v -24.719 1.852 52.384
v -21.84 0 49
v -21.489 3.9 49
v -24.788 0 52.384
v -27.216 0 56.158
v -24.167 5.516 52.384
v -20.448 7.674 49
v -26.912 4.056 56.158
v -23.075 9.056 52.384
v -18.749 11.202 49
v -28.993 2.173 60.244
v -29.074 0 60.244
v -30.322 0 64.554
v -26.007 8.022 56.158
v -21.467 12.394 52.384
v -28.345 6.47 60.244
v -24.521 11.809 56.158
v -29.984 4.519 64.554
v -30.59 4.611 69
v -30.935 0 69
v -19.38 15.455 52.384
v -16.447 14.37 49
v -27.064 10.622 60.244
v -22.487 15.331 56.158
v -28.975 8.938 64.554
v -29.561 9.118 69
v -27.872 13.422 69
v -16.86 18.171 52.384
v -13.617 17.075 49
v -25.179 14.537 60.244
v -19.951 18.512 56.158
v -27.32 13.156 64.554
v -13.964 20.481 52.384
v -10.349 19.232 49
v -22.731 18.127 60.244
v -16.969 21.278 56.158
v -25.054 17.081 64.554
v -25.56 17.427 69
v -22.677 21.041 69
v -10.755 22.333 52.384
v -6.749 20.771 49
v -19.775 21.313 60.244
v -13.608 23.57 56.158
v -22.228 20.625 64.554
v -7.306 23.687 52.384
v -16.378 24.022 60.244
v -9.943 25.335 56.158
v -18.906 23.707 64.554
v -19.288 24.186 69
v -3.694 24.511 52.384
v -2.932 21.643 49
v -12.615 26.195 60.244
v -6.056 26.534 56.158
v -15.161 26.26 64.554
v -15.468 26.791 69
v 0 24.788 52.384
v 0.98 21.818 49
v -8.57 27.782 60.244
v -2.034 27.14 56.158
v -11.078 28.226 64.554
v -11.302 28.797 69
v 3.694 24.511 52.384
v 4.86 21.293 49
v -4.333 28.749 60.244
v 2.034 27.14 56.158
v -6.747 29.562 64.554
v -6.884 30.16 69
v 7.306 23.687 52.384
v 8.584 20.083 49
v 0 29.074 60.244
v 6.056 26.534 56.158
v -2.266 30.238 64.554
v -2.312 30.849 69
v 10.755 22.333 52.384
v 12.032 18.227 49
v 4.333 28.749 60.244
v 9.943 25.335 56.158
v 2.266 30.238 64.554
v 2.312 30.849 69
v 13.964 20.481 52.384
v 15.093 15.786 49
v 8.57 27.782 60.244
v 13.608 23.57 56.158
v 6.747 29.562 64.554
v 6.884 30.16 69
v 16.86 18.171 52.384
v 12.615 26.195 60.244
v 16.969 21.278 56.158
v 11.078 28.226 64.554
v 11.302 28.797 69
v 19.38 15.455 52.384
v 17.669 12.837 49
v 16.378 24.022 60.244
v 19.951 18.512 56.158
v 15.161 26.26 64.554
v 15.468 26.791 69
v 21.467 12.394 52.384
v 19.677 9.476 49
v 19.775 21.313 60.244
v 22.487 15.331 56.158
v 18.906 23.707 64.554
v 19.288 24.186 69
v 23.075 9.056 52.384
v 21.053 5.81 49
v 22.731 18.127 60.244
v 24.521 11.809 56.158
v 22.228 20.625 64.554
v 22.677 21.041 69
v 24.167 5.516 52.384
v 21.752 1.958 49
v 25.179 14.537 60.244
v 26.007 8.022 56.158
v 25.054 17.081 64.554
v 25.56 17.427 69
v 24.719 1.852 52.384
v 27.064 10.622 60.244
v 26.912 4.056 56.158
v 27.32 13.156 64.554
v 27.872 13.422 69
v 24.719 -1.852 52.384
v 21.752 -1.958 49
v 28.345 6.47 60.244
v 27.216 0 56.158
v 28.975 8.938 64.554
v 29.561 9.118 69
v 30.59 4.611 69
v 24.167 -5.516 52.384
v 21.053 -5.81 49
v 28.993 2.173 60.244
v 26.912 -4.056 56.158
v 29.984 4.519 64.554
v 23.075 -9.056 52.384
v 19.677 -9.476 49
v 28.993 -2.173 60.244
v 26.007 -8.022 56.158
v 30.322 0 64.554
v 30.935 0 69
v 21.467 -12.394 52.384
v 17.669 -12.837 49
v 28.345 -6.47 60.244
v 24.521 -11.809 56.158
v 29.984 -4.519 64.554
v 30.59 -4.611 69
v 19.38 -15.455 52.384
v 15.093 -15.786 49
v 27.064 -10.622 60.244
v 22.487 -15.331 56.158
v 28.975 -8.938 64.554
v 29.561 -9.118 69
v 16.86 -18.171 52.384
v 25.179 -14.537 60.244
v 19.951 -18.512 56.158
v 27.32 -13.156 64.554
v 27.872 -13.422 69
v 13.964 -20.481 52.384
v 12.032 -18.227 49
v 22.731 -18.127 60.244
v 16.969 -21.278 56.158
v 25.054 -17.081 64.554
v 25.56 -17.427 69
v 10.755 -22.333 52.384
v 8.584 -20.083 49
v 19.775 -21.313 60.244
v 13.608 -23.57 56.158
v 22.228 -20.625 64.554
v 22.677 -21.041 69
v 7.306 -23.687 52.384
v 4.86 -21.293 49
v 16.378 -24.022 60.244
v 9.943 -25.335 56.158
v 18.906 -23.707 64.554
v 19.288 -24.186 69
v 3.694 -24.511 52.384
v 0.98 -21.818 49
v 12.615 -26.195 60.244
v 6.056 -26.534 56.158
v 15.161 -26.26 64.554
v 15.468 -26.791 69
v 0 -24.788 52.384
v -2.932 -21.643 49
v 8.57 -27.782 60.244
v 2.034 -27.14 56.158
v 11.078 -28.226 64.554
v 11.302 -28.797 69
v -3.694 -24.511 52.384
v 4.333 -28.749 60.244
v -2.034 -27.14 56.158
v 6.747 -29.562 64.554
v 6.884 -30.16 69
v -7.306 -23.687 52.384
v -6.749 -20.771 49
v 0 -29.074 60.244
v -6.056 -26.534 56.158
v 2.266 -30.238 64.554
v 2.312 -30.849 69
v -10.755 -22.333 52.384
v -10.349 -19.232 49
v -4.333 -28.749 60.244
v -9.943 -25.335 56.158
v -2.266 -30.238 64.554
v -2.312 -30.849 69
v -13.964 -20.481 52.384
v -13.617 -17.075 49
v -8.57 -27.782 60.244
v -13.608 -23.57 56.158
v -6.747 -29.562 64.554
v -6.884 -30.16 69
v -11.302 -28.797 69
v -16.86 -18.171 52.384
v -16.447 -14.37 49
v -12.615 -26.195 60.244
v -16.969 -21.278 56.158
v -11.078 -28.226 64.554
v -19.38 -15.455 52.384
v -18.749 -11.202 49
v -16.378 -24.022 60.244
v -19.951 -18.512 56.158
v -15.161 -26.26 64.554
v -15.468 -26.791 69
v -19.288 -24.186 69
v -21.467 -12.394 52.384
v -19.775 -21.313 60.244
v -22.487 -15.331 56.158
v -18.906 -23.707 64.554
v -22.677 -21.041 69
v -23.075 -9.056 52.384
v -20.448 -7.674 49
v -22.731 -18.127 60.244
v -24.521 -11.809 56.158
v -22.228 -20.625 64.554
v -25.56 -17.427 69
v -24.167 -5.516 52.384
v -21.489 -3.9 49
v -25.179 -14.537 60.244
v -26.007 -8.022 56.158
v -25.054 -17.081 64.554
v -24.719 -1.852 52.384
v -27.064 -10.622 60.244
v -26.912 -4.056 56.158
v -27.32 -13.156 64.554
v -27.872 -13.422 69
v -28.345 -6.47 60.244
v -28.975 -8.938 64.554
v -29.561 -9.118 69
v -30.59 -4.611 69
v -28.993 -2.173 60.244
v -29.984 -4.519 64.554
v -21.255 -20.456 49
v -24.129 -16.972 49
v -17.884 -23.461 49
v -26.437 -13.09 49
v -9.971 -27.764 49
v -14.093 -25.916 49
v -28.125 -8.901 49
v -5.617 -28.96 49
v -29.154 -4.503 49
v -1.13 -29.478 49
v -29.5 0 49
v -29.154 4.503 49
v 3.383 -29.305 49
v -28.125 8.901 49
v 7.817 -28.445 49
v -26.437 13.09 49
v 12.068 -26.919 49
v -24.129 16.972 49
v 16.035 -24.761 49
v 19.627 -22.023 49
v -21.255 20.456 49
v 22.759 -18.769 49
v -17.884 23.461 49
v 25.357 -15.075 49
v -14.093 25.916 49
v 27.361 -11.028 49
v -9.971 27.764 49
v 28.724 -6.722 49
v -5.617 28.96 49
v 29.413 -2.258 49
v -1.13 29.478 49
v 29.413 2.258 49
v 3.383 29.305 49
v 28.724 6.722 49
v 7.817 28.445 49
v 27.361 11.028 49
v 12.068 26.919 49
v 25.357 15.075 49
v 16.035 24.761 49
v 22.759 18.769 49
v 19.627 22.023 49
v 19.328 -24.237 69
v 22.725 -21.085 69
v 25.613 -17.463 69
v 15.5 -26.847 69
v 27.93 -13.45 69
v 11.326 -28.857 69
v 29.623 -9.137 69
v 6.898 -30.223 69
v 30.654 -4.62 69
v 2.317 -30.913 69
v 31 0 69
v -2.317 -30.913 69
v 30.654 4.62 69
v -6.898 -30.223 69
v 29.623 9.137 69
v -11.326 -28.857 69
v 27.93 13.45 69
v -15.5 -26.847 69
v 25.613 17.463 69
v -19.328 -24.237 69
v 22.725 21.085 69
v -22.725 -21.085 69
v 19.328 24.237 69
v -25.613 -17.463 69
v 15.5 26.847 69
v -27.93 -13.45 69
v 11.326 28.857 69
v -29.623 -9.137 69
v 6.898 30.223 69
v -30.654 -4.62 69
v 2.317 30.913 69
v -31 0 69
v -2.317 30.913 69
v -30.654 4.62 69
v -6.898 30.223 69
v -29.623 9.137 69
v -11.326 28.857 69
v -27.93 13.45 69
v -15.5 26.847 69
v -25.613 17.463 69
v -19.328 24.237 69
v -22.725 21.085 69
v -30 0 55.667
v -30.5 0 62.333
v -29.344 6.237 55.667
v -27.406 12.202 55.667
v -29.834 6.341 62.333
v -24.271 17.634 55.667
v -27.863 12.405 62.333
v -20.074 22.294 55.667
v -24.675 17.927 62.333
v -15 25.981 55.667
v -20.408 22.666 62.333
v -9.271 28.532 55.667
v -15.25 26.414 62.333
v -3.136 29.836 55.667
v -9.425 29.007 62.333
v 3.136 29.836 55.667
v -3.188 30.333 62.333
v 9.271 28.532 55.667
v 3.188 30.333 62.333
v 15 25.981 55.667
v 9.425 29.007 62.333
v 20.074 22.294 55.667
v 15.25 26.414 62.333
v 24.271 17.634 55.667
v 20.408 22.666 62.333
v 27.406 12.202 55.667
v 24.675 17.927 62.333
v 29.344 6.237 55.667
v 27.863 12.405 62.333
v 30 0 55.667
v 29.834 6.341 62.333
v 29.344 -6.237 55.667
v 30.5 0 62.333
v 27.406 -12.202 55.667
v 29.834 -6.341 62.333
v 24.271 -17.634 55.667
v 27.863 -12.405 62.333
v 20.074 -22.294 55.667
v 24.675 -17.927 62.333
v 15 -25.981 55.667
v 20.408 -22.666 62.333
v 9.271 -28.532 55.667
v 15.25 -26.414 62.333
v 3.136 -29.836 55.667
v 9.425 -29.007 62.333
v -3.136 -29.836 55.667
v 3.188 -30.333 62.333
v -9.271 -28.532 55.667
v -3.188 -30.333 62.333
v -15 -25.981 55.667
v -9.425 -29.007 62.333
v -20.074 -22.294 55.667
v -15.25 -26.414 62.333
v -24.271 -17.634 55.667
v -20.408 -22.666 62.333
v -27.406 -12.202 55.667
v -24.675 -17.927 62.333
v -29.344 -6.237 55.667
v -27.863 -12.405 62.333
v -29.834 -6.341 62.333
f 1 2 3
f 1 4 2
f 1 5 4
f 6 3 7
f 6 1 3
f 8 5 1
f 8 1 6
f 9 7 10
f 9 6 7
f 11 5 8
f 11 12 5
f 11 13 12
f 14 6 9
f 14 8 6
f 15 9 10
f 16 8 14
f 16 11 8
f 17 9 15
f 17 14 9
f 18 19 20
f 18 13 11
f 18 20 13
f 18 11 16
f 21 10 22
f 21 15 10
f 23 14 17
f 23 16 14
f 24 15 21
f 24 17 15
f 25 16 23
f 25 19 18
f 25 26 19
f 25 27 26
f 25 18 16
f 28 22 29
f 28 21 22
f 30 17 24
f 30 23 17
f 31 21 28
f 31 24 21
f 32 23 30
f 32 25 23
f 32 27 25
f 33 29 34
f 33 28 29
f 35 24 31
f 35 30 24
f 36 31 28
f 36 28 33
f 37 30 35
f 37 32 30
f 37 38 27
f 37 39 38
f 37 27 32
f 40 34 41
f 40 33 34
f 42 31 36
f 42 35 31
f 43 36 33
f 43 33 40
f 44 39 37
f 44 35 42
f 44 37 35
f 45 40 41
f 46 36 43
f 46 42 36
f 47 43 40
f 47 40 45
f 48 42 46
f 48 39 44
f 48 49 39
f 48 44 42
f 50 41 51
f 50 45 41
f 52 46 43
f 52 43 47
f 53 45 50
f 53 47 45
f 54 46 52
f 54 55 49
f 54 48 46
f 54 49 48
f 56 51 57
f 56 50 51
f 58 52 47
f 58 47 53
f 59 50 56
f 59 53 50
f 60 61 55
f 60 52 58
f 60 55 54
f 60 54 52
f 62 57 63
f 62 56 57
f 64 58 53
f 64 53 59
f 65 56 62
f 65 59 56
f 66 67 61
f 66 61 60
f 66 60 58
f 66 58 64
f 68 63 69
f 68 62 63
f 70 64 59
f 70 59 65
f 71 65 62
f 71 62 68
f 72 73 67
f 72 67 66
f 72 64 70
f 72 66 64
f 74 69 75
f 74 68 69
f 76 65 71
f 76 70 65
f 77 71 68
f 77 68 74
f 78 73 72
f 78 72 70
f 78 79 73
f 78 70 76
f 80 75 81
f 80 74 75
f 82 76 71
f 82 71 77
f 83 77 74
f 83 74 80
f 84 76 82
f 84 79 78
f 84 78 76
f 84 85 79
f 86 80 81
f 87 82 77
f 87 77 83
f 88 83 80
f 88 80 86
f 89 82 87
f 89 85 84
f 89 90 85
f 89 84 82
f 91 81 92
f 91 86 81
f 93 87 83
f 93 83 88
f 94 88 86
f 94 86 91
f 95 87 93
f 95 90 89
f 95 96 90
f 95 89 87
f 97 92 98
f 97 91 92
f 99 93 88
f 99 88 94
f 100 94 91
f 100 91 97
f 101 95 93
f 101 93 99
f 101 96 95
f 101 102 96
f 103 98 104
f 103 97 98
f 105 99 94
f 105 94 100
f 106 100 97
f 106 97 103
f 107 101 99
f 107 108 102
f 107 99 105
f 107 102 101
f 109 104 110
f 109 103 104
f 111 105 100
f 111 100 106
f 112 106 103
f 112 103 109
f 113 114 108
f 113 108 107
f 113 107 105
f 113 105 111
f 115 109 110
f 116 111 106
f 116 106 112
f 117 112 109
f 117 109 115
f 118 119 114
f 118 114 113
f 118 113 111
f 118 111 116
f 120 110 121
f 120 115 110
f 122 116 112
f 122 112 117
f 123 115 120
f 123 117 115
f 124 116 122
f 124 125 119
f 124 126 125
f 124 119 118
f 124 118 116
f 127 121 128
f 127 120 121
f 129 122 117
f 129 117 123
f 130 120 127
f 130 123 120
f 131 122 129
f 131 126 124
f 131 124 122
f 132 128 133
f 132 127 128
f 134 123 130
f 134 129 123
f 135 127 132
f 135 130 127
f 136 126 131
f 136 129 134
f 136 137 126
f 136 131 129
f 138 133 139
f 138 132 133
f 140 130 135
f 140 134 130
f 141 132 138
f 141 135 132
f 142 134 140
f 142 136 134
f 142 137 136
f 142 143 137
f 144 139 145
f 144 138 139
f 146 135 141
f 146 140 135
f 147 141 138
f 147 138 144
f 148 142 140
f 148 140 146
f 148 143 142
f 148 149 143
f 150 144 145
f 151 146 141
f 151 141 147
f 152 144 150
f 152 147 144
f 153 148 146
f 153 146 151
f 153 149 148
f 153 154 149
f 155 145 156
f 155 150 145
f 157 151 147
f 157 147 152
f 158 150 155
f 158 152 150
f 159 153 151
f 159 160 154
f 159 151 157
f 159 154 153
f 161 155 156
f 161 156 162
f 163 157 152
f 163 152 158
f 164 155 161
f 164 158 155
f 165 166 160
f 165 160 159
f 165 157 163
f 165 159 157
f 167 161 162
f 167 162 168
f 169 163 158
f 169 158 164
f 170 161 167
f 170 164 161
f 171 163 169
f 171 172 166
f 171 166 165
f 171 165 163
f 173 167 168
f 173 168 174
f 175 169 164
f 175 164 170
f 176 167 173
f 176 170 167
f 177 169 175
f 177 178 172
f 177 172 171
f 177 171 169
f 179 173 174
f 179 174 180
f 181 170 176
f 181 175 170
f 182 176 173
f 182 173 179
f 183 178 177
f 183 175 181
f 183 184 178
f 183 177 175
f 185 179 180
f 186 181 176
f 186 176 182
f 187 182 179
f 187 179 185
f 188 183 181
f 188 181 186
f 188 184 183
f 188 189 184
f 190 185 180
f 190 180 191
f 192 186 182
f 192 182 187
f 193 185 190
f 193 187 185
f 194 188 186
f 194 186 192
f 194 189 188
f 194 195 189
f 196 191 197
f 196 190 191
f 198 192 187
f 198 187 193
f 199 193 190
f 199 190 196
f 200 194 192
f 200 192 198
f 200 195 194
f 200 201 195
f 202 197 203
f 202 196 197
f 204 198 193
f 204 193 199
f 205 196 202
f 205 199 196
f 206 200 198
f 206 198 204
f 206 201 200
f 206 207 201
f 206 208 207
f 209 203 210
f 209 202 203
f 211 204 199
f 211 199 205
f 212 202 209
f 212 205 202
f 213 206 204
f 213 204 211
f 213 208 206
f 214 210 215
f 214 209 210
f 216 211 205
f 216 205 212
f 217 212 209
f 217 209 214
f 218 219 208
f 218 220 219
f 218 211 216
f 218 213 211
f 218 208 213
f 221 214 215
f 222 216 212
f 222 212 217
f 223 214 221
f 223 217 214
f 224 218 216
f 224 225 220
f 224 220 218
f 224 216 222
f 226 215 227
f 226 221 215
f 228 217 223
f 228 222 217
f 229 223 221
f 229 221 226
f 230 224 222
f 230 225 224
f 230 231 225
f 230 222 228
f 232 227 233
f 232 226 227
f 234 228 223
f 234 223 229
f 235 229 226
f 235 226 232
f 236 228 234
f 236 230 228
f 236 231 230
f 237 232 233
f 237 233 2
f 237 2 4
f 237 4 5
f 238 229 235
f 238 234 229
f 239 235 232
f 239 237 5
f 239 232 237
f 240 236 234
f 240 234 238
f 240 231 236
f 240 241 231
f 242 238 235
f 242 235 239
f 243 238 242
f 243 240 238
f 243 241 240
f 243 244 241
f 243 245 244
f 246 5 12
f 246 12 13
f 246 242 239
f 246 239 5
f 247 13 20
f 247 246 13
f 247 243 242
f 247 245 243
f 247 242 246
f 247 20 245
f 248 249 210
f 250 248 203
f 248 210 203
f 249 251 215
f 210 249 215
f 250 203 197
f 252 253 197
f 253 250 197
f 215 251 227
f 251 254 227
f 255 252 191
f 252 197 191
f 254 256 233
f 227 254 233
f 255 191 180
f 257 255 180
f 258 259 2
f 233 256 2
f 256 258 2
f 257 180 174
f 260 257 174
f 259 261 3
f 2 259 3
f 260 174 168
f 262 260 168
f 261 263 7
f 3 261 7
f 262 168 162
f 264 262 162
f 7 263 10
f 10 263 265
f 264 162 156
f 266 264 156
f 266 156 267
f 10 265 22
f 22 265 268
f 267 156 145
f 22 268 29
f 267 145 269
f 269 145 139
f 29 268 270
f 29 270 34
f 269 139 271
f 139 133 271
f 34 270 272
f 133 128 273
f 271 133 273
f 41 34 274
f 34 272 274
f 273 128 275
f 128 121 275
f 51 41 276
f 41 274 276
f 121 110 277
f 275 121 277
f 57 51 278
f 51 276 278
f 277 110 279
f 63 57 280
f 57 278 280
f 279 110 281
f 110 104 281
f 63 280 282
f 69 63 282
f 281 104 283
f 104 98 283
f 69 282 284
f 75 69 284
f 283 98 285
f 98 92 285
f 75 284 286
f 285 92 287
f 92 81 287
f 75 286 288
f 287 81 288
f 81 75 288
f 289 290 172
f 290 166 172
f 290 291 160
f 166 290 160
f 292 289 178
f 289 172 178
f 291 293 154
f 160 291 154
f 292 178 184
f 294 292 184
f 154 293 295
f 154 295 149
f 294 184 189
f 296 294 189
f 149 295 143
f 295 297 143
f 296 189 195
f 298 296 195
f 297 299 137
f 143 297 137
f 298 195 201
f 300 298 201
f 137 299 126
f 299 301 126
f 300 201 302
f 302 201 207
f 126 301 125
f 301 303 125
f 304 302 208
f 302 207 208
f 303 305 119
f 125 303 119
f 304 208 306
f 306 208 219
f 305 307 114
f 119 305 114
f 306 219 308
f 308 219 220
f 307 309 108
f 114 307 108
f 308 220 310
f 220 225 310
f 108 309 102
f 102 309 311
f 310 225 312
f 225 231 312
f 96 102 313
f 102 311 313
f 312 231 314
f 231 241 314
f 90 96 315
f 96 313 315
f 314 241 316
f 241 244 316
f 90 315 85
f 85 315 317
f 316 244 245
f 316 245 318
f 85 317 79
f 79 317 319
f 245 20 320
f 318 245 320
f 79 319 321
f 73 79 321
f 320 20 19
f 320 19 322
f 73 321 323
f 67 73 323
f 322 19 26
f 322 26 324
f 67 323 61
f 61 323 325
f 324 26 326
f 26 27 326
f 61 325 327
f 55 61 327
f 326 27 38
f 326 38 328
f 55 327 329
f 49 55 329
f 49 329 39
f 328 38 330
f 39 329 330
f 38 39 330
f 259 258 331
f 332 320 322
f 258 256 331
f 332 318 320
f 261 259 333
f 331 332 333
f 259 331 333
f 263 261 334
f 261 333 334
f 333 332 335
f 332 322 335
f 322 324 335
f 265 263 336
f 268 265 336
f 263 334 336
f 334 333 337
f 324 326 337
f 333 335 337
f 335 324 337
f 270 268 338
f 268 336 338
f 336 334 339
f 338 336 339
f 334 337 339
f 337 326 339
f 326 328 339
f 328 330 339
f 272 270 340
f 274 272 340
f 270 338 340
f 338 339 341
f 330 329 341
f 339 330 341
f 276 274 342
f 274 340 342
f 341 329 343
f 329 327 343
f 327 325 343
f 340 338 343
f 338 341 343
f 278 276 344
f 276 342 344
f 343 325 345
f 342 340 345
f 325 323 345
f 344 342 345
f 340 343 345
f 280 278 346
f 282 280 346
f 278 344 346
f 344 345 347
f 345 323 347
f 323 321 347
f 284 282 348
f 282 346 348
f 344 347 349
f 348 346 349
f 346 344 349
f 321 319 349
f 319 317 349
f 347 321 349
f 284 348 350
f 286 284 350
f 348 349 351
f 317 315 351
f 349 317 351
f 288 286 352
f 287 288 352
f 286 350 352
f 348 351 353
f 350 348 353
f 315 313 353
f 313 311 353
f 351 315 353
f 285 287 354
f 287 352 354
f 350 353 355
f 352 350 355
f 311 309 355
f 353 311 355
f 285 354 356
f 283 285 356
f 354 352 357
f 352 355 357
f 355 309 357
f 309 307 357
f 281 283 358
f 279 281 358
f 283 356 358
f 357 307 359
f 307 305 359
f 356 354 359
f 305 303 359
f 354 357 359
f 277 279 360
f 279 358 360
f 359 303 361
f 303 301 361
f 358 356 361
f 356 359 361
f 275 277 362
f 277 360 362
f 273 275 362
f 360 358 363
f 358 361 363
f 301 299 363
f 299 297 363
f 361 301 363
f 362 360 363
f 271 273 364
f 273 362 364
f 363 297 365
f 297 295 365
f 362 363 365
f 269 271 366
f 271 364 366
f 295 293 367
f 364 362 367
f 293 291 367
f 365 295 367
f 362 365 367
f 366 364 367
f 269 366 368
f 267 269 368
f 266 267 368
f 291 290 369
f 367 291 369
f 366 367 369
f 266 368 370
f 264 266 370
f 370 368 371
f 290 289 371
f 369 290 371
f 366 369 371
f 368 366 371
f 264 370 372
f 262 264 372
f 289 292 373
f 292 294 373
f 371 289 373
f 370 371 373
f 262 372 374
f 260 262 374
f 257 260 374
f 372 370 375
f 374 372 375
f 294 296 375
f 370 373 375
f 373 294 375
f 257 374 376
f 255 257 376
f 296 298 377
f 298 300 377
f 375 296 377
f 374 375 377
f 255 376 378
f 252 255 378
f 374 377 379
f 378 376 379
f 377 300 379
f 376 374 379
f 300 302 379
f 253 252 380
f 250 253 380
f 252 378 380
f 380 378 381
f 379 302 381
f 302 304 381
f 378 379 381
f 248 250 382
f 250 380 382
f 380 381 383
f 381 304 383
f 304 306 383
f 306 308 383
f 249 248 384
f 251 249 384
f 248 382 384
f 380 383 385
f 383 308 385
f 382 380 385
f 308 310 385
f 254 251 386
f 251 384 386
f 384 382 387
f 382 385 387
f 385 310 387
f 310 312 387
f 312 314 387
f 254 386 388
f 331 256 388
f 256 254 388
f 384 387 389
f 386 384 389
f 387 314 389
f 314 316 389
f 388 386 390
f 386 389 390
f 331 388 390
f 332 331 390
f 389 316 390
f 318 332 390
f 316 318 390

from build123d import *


with BuildPart() as sphere:
    # Sphere → Sphere (revolve)
    with BuildSketch(Plane(origin=(0, 0, 71), x_dir=(1, 0, 0), z_dir=(0, -1, 0))):
        with BuildLine():
            ThreePointArc((0, -31), (31, 0), (0, 31))
            Line((0, 31), (0, -31))
        make_face()
    revolve(axis=Axis((0, 0, 71), (0, 0, 1)))


with BuildPart() as cut002:
    # Cone002 → Cone002 (revolve)
    with BuildSketch(Plane(origin=(0, 0, 49), x_dir=(1, 0, 0), z_dir=(0, -1, 0))):
        Polygon((0, 0), (29.5, 0), (31, 20), (0, 20), align=None)
    revolve(axis=Axis((0, 0, 49), (0, 0, 1)))

    # Cut002: cut Sphere
    add(sphere.part, mode=Mode.SUBTRACT)


with BuildPart() as part_mirroring002:
    # Part__Mirroring002: instance of Cut002
    add(cut002.part.mirror(Plane(origin=(0, 0, 0), x_dir=(0, -1, 0), z_dir=(1, 0, 0))))


solid = part_mirroring002.part
